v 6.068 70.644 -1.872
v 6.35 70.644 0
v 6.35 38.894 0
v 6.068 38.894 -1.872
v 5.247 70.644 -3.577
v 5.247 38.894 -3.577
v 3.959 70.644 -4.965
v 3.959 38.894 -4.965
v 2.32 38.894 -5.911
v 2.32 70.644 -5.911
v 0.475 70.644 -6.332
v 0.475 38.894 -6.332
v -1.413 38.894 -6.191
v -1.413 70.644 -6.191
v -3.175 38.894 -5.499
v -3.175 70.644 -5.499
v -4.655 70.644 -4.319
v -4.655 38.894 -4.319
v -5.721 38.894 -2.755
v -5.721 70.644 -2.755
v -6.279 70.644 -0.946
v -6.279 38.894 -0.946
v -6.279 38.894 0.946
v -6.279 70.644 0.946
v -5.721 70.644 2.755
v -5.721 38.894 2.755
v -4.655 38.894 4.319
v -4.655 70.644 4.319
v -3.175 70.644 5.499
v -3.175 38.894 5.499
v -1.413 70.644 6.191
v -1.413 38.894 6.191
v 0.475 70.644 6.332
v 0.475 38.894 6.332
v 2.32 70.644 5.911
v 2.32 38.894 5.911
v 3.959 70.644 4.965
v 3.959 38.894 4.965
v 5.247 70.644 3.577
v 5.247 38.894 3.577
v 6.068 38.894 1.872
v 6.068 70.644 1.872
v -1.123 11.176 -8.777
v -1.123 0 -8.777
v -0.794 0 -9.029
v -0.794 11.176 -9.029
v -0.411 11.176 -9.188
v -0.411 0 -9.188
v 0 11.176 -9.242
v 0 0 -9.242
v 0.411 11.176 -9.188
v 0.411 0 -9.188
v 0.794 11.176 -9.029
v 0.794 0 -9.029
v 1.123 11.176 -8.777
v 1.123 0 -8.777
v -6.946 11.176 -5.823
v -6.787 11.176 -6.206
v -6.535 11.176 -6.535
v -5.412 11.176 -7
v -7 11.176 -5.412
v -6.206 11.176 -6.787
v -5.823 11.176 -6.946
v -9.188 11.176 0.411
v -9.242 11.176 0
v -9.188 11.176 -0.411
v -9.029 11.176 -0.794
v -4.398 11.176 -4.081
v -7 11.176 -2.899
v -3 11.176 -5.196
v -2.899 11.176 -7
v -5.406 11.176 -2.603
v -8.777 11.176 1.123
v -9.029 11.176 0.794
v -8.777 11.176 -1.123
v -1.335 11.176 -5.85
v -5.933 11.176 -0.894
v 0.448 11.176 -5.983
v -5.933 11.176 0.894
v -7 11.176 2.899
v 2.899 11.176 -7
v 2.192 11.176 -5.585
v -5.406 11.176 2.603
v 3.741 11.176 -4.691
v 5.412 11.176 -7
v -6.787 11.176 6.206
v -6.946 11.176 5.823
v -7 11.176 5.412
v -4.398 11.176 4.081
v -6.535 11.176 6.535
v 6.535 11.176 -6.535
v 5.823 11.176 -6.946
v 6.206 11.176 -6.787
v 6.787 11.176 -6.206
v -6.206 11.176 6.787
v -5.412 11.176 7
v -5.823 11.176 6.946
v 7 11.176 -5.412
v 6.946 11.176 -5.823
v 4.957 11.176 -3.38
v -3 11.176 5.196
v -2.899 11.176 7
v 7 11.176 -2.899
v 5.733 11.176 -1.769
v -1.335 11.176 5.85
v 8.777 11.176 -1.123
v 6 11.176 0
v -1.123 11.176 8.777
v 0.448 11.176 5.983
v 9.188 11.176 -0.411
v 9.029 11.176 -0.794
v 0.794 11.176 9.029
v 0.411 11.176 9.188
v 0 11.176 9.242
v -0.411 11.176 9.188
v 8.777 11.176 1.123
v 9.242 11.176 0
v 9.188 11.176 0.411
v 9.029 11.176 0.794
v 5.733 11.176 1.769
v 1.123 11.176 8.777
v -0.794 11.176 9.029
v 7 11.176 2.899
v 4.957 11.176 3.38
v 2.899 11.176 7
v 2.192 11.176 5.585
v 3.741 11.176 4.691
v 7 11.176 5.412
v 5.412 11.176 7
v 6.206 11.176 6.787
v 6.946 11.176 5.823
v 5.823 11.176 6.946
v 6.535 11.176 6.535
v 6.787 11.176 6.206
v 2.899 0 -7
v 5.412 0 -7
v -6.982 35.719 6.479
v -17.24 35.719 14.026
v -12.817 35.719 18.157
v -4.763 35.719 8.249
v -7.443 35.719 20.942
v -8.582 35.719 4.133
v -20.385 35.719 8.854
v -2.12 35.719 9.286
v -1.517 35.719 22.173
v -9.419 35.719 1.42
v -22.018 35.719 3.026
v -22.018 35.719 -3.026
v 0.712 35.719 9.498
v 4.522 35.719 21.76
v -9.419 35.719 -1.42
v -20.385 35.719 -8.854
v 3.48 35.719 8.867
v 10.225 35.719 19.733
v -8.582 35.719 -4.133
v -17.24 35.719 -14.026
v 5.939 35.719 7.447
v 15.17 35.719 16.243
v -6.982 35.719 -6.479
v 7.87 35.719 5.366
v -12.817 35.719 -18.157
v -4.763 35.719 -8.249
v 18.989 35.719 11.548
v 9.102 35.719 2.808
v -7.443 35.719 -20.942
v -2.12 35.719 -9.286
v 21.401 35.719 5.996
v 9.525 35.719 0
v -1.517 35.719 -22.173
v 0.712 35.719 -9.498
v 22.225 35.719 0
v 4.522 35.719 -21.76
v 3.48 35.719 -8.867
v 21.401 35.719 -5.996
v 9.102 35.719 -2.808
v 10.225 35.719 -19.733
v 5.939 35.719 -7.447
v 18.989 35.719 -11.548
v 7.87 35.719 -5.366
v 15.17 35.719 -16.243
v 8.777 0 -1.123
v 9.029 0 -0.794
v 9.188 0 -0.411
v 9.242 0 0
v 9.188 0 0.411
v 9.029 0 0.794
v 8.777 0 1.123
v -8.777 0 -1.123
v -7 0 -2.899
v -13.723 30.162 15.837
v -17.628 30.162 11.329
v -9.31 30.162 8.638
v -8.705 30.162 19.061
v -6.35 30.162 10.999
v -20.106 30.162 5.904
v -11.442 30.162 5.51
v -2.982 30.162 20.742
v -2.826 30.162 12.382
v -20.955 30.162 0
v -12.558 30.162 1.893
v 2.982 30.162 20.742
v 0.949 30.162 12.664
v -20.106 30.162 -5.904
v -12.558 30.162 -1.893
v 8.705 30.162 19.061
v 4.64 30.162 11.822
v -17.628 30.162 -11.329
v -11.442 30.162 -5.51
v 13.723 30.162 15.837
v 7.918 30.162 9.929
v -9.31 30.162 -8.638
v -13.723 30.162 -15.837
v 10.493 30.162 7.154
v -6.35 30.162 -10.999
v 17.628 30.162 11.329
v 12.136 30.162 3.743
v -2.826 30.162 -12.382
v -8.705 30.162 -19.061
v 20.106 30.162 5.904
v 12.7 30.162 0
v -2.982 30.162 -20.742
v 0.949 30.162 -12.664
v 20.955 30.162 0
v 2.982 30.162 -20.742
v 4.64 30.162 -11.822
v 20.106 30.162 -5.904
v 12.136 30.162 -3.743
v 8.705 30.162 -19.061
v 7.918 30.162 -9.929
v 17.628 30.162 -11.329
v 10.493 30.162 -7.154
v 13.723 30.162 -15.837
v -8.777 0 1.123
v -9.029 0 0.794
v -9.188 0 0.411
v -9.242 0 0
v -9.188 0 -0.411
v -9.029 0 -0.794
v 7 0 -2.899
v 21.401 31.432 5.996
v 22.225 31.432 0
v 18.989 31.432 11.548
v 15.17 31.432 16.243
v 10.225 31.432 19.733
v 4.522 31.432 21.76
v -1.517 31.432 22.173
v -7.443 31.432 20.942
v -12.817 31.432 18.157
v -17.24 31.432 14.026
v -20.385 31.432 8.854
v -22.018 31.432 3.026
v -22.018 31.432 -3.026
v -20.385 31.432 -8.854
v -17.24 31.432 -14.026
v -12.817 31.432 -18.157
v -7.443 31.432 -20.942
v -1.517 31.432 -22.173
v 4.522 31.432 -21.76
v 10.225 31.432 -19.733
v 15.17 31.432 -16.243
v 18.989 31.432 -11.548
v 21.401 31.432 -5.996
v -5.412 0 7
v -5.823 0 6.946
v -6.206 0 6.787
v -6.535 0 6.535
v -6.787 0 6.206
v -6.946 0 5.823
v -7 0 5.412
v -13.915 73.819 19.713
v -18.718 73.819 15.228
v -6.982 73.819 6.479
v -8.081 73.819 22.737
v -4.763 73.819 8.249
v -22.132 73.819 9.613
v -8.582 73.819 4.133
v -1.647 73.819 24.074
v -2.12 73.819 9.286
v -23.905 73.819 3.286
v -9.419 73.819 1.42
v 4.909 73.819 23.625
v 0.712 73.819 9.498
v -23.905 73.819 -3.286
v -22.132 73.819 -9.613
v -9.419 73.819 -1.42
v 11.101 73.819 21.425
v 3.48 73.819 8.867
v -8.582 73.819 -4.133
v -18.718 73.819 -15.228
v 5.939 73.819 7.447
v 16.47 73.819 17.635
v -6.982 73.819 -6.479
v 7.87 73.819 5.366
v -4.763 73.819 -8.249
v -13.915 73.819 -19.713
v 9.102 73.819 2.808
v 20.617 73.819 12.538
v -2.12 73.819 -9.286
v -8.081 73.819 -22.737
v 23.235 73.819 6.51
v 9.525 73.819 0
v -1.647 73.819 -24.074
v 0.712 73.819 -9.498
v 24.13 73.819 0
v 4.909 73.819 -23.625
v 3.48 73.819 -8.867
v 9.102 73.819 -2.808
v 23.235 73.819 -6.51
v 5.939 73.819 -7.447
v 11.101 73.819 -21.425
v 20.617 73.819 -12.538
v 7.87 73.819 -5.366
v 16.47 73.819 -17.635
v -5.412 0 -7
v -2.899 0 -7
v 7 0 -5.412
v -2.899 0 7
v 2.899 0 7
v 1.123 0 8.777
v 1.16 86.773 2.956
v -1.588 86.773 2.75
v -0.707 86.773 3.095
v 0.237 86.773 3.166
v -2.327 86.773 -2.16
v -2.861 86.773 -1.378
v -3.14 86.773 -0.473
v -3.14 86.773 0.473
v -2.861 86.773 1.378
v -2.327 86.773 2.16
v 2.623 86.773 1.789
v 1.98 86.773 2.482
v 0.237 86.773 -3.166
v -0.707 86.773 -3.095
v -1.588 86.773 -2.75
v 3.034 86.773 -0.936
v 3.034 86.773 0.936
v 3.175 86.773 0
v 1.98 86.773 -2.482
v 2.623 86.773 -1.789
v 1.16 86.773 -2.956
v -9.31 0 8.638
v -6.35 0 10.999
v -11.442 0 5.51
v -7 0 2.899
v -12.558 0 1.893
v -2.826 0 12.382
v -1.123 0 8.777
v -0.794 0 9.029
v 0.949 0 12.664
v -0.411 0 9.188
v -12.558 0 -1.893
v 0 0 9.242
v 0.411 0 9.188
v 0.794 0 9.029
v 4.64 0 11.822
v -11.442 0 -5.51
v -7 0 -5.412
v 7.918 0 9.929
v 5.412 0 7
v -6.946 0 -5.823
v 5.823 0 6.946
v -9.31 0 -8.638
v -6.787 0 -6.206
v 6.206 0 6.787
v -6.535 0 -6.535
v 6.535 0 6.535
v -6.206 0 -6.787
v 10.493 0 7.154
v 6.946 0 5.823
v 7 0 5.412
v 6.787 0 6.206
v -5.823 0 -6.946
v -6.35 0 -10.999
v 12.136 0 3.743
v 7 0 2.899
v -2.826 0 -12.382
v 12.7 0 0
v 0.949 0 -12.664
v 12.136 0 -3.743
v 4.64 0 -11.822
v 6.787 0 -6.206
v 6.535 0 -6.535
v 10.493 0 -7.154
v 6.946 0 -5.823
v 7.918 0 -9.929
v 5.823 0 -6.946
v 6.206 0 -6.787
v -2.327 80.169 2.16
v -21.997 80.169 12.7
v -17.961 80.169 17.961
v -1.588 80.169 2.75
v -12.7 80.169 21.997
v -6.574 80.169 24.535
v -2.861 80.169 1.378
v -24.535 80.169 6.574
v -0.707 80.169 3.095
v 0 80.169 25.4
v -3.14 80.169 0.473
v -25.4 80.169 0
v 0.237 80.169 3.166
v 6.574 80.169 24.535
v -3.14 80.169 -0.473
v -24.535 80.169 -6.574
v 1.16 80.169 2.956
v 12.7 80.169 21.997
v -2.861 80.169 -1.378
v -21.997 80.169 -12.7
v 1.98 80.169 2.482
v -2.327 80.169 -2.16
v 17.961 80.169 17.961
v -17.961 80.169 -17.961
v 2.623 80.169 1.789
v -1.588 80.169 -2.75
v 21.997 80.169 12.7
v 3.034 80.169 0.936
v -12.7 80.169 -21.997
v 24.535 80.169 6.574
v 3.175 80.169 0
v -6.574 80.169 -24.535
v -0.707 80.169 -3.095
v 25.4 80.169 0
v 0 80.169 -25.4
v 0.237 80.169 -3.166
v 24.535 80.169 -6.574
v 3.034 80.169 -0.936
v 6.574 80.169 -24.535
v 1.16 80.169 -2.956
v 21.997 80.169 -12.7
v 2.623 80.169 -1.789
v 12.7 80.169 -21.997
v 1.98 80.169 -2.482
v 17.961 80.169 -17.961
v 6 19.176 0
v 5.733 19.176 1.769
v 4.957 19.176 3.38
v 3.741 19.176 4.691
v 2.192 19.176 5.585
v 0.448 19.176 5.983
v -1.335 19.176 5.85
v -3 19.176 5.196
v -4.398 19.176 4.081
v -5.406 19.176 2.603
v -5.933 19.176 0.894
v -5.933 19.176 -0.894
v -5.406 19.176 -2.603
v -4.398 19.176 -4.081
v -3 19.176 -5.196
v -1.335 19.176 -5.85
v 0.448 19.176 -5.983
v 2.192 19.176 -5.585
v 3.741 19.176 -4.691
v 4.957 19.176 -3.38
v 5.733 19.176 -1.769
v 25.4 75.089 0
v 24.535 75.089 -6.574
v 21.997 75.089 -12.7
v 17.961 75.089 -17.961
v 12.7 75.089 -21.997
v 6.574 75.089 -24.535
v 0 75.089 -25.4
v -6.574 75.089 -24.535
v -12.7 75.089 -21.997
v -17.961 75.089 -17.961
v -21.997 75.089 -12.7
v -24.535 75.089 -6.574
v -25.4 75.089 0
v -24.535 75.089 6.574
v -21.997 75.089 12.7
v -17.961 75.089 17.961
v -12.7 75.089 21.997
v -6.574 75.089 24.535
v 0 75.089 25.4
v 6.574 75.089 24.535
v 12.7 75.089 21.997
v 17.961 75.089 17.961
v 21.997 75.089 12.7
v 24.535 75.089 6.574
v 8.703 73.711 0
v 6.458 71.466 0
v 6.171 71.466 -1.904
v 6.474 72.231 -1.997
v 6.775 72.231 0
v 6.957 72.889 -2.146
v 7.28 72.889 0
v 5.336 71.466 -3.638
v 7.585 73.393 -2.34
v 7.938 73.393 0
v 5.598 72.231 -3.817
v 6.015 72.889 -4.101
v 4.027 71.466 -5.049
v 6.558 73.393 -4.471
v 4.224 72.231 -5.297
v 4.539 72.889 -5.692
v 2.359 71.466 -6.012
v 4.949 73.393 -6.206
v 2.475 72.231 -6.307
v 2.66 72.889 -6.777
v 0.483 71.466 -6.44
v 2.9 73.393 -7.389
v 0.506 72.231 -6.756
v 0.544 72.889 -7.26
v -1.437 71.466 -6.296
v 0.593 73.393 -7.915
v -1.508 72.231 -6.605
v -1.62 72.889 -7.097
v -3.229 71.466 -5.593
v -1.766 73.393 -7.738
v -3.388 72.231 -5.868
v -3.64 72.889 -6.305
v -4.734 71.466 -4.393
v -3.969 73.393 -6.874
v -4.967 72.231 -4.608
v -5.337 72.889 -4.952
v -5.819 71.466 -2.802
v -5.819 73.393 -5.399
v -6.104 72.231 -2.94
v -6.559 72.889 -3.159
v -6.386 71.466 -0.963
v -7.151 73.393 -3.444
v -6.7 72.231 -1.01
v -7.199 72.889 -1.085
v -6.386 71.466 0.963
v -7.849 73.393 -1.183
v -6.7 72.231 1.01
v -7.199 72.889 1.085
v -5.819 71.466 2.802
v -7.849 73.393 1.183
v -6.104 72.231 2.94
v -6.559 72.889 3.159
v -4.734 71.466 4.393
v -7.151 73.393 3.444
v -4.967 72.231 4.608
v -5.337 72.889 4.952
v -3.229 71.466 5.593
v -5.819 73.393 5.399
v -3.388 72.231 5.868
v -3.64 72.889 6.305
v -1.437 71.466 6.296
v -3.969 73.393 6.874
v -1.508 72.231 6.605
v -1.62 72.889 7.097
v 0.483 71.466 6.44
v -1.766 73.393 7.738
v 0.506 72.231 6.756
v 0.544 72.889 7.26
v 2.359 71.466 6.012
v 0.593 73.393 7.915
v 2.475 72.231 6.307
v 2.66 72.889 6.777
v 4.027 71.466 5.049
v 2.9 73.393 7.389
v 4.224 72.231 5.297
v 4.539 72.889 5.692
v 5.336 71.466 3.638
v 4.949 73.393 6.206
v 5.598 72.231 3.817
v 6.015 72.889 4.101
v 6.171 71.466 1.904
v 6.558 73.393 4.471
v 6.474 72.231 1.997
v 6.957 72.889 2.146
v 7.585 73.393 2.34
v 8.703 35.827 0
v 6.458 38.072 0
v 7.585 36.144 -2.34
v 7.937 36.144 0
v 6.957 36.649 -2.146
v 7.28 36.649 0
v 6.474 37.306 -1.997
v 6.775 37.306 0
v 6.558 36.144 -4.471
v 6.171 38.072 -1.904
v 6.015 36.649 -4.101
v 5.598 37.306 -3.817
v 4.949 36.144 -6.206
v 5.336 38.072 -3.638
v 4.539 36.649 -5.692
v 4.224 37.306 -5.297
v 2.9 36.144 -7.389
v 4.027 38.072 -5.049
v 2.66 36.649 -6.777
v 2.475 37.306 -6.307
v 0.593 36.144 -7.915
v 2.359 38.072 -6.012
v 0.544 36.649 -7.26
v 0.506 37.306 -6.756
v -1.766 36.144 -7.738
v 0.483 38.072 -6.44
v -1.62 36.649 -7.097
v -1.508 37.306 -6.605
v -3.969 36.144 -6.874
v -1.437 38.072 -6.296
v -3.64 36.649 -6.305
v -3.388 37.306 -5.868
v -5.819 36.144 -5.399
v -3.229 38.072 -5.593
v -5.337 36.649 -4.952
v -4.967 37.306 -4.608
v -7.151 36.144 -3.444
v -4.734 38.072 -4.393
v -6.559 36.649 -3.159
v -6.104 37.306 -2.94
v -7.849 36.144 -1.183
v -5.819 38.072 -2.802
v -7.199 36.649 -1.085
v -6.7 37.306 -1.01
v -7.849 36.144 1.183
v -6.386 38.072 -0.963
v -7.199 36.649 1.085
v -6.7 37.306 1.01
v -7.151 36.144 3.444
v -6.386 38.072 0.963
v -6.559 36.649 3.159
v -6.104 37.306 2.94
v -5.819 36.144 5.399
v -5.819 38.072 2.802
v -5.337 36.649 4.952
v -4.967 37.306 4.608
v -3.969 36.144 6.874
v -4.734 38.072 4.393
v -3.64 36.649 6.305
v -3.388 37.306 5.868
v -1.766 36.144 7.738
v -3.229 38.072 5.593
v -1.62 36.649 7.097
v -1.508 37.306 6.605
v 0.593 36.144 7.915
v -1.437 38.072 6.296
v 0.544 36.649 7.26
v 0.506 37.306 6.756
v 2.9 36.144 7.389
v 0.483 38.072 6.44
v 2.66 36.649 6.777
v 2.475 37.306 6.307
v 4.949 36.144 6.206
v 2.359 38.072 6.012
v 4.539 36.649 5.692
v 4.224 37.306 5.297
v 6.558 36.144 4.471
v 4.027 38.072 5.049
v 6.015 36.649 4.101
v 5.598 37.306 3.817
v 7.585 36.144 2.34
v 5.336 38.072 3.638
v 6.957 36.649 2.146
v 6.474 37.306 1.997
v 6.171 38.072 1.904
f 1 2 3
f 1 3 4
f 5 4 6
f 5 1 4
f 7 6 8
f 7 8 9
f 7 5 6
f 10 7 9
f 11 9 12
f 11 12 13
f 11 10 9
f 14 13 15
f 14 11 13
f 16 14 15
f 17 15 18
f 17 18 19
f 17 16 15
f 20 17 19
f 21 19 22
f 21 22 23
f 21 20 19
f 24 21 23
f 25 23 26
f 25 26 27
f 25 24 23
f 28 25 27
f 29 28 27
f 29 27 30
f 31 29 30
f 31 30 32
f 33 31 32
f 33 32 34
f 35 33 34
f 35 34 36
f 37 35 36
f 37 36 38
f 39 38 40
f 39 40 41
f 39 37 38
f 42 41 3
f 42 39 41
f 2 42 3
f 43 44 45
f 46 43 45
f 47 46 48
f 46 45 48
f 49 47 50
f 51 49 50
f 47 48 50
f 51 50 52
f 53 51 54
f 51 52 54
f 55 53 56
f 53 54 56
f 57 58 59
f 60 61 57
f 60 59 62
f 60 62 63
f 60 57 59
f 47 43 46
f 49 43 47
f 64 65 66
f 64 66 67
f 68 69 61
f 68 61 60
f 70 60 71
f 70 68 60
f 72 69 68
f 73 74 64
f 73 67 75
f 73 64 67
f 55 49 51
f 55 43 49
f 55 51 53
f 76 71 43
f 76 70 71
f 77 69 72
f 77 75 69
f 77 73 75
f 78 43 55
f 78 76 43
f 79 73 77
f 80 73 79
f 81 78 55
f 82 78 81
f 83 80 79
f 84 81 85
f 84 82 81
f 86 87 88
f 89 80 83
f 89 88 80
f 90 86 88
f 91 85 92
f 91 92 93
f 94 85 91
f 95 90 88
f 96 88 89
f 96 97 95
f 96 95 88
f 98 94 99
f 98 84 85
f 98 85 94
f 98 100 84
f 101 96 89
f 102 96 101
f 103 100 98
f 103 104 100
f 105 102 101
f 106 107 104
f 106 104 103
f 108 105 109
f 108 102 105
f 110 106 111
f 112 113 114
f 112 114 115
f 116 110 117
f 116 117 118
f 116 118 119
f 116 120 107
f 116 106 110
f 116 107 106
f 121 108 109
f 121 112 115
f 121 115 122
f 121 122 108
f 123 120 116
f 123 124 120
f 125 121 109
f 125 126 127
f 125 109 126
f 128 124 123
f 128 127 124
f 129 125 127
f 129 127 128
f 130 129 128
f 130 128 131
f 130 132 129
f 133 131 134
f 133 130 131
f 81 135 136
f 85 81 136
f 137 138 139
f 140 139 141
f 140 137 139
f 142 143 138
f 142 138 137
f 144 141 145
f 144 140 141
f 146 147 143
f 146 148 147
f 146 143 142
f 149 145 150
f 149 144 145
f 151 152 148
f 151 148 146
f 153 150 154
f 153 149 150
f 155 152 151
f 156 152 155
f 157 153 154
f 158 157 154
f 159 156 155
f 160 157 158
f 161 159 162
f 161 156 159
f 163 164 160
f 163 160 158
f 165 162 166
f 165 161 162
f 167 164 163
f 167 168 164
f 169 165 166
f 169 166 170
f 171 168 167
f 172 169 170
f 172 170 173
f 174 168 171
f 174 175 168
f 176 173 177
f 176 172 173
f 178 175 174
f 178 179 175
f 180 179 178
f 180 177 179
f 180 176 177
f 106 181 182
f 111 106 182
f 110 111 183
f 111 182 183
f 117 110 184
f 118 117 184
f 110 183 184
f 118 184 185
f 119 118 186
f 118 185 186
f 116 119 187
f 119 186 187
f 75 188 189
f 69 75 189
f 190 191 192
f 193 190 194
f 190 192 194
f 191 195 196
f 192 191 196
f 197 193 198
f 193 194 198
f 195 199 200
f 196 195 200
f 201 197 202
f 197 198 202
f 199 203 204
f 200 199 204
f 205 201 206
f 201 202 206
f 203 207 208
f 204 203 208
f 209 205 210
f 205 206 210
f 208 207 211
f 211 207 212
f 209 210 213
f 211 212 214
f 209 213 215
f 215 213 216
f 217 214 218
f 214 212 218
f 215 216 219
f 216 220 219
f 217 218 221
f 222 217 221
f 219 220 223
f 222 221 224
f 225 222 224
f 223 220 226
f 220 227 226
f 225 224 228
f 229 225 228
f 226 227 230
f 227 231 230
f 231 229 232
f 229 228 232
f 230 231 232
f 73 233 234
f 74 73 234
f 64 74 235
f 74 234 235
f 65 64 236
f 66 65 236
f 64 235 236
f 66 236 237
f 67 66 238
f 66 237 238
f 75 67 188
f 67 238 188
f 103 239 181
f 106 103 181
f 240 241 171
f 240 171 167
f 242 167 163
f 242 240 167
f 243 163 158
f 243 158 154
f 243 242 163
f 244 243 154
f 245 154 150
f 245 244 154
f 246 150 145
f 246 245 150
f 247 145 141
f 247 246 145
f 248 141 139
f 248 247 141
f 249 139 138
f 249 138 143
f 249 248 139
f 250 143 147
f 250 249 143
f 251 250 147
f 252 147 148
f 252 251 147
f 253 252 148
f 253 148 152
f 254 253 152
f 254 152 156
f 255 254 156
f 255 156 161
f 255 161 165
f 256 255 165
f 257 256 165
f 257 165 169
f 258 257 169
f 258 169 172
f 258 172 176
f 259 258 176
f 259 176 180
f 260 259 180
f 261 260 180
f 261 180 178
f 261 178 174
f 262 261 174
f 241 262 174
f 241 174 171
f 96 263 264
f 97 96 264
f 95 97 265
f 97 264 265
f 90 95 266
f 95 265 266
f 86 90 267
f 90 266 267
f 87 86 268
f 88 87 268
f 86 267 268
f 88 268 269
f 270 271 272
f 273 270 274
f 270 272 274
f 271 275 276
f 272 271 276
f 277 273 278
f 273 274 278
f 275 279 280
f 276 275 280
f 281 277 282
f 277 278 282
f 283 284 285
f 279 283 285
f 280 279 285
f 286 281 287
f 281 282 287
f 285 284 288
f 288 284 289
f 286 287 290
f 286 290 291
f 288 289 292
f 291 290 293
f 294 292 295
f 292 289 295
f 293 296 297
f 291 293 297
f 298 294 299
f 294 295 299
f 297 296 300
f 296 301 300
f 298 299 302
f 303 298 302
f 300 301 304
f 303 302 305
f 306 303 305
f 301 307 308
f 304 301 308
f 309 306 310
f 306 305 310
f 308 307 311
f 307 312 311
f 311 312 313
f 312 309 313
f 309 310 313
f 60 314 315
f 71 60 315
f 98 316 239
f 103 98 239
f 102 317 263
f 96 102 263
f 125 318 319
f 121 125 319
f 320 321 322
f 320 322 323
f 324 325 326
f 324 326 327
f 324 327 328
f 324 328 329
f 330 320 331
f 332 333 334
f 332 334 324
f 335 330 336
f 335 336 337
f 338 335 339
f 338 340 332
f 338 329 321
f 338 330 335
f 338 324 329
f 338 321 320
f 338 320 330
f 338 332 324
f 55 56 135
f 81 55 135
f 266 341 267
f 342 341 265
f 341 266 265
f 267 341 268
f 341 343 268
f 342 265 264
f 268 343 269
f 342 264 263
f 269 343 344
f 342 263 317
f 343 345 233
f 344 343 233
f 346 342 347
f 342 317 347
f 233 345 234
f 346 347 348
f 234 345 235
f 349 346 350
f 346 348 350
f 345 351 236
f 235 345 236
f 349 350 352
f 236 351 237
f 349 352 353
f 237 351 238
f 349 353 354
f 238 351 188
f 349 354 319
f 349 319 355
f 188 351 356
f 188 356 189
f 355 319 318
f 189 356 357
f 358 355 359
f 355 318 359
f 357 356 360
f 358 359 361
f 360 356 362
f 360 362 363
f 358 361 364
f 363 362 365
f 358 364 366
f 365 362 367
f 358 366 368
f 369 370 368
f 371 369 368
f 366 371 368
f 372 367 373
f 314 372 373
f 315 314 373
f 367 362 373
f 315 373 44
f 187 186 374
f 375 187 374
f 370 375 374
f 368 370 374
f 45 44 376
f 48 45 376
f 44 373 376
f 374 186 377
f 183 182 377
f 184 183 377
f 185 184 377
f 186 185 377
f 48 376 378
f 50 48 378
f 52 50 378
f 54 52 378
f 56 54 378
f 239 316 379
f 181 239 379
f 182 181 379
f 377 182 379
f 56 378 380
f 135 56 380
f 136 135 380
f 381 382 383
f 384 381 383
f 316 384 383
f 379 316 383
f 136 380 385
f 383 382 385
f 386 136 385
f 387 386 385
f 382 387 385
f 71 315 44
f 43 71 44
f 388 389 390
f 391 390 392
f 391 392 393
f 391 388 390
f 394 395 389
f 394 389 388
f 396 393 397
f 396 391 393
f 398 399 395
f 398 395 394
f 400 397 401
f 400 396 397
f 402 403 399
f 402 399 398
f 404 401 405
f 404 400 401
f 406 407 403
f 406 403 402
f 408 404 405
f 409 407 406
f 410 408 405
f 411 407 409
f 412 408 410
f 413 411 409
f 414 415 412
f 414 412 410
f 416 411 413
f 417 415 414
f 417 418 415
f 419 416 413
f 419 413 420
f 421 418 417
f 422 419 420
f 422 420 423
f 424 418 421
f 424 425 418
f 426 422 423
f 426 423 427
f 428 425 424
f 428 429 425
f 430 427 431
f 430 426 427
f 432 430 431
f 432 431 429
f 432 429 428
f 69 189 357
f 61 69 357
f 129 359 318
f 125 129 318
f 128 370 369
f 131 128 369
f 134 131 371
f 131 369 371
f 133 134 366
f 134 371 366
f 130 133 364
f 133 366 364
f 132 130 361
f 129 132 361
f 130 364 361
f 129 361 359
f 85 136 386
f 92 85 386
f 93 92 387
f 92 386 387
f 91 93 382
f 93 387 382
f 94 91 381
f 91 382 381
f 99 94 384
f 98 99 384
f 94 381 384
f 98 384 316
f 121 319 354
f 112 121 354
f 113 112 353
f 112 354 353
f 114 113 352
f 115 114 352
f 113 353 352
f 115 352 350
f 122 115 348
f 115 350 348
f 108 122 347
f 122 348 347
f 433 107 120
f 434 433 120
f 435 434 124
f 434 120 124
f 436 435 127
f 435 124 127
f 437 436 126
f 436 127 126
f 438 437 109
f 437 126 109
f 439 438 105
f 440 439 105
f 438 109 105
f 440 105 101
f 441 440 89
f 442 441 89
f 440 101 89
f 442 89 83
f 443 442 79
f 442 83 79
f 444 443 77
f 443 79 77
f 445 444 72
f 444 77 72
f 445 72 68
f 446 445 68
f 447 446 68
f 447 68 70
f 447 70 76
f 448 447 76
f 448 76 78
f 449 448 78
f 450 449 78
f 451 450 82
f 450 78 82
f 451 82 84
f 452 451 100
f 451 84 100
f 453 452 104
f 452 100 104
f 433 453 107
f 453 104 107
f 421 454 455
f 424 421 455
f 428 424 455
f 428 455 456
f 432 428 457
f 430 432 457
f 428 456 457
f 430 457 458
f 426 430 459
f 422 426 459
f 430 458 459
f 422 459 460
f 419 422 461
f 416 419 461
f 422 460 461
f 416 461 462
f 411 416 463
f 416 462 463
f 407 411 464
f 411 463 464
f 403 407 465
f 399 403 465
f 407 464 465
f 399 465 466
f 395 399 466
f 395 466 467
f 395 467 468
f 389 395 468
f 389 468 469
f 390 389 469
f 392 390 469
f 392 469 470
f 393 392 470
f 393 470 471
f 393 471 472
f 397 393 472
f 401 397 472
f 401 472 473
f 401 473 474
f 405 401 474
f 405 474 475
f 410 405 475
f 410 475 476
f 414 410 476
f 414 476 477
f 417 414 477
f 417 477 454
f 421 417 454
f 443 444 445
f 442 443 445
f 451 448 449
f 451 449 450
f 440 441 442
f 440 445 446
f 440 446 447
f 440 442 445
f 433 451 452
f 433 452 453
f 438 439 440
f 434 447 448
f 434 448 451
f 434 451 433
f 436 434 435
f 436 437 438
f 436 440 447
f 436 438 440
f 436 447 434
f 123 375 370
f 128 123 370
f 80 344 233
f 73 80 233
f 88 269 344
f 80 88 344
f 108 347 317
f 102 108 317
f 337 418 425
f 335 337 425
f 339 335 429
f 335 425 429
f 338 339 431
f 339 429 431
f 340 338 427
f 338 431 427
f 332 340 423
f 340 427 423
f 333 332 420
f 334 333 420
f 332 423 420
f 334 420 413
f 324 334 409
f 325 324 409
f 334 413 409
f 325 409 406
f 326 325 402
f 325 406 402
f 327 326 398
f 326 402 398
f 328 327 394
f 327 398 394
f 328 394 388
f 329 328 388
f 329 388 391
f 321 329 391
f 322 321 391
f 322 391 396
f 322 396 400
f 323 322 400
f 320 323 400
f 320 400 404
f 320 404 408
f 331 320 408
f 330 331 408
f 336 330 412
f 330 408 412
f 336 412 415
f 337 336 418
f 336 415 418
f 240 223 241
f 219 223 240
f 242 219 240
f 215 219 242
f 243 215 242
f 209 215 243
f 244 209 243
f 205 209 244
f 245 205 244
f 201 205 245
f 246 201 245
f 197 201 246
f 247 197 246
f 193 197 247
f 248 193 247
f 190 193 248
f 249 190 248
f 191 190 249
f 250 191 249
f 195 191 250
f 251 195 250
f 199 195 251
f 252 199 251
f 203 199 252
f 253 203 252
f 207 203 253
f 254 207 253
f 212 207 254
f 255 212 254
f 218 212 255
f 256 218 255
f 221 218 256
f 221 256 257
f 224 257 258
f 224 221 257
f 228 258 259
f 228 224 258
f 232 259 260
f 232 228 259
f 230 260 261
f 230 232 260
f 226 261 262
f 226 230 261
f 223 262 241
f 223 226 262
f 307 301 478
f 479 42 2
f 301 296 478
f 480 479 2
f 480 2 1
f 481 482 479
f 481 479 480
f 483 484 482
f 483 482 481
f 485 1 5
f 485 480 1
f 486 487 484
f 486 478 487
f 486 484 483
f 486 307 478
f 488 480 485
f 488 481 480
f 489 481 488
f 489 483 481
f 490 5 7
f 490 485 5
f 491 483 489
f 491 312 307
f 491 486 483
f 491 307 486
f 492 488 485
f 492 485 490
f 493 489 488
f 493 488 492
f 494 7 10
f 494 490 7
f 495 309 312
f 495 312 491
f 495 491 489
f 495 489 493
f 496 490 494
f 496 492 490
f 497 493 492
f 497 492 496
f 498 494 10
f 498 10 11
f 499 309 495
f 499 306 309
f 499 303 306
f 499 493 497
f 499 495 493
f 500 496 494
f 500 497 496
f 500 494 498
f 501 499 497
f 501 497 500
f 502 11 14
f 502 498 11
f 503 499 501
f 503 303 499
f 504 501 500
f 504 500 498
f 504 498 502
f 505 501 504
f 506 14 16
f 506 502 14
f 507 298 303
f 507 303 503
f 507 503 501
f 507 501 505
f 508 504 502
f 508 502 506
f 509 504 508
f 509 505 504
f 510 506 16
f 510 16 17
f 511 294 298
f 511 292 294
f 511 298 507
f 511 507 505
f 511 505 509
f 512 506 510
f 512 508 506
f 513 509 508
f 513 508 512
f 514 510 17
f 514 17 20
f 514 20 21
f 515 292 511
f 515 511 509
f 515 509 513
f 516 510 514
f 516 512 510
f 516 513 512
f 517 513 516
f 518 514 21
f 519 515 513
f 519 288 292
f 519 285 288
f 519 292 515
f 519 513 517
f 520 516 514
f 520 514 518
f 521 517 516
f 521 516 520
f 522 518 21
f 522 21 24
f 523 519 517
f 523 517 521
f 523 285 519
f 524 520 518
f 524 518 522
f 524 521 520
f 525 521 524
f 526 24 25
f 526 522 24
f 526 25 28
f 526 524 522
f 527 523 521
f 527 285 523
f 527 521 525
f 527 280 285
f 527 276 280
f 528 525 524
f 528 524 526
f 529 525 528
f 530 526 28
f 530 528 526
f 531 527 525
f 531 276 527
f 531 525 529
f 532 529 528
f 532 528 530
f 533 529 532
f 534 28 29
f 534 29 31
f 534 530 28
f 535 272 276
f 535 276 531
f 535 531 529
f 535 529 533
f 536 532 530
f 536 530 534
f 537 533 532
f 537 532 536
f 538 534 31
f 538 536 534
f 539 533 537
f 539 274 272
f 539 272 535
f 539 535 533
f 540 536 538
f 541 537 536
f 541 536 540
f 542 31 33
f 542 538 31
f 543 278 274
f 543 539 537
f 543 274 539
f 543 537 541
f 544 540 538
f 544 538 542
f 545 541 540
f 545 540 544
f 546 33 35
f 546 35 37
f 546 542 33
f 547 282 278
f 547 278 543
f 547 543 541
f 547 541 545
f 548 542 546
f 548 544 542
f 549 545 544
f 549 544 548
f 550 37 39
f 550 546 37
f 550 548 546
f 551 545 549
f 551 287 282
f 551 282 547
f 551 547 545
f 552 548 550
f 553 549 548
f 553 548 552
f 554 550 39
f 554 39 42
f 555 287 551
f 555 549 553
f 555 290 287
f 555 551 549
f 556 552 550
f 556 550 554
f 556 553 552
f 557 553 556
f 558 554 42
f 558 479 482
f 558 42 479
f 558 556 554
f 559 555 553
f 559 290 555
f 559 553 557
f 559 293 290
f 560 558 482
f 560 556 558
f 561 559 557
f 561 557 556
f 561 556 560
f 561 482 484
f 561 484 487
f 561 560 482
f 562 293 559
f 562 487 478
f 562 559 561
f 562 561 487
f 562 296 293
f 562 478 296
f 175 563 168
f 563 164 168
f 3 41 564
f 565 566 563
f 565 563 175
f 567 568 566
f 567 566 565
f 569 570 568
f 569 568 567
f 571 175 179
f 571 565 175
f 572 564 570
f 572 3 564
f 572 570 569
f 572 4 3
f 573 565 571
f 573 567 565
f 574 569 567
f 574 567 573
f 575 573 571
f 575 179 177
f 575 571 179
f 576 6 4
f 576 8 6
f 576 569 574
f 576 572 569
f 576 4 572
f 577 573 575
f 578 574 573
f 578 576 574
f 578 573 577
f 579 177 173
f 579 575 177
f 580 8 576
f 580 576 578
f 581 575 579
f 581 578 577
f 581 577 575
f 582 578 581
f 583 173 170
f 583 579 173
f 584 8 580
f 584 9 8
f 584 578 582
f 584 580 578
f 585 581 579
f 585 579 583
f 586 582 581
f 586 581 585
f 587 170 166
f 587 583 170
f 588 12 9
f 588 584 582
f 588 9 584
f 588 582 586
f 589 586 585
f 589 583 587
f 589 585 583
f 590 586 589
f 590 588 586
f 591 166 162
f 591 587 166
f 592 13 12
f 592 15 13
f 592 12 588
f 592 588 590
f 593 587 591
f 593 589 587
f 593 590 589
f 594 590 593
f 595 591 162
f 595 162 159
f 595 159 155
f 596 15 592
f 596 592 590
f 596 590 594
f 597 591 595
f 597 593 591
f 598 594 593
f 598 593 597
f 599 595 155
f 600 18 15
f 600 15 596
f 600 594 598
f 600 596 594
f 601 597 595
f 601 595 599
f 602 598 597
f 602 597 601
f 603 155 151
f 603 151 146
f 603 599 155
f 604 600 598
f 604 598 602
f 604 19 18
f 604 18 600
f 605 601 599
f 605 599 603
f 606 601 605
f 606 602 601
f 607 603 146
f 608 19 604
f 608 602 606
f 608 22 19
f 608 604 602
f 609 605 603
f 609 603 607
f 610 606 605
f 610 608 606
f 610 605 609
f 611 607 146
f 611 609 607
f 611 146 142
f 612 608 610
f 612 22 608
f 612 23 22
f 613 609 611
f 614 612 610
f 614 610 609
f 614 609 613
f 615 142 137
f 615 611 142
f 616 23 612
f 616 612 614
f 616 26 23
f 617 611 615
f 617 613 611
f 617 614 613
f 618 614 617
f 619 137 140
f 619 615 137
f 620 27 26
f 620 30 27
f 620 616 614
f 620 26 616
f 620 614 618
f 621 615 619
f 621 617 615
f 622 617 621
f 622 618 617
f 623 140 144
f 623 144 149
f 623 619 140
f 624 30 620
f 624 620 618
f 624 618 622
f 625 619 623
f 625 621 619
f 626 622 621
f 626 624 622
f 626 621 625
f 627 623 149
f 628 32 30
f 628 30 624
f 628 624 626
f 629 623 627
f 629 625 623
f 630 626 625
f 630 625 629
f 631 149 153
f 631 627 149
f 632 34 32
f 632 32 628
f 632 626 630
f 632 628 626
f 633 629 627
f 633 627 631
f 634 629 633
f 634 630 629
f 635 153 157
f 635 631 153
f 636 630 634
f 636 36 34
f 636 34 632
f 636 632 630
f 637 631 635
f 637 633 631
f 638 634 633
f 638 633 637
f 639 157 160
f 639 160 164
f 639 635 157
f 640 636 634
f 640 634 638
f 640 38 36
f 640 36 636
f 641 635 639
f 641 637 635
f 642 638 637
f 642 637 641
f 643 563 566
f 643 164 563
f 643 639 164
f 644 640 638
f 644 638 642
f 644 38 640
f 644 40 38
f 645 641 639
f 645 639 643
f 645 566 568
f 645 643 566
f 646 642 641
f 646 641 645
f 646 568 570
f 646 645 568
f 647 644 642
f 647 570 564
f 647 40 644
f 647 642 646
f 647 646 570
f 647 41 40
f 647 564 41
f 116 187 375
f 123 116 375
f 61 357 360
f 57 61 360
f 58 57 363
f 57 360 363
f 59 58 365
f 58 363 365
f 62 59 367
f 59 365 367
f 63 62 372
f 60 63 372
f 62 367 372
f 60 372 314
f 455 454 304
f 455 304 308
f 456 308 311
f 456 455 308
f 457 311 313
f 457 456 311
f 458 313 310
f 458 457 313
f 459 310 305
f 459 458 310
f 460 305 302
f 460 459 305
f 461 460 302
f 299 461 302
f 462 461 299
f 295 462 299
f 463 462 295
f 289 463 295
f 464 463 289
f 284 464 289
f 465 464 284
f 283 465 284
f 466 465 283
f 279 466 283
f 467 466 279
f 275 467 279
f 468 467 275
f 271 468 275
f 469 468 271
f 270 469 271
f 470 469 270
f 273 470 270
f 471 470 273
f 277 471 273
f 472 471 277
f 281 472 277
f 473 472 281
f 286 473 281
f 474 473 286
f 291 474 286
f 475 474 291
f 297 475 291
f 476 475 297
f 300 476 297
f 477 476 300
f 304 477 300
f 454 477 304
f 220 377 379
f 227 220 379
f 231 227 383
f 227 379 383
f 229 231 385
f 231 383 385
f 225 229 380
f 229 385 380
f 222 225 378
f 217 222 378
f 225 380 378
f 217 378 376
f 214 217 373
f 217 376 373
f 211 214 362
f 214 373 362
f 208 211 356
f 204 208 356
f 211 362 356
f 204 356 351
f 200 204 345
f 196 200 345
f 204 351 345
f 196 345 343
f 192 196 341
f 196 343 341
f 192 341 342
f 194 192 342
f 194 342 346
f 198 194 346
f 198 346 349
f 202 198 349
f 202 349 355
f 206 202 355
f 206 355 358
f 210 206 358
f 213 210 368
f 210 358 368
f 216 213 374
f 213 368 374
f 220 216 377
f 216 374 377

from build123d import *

# Parameters (mm, degrees)
SKETCH1_R           = 12.7
BOSS_EXTRUDE1_DEPTH = 30.1625
SKETCH4_R           = 25.4
BOSS_EXTRUDE2_DEPTH = 50.00625
CUT_EXTRUDE1_DEPTH  = 11.176
SKETCH3_R           = 6
CUT_EXTRUDE2_DEPTH  = 8
SKETCH5_R           = 3.175
BOSS_EXTRUDE3_DEPTH = 6.604
CUT_EXTRUDE3_START  = -6.35
SKETCH9_R           = 25.4
SKETCH9_R_2         = 6.35
CUT_EXTRUDE3_DEPTH  = 38.1
CUT_EXTRUDE4_REACH  = 58.61
SKETCH10_R          = 25.4
SKETCH10_R_2        = 22.225
FILLET1_R           = 3.175
CHAMFER1_SIZE       = 1.27


with BuildPart() as part:
    # Sketch1 → Boss-Extrude1 (new body)
    with BuildSketch(Plane(origin=(0, 0, 0), x_dir=(1, 0, 0), z_dir=(0, 1, 0))):
        Circle(SKETCH1_R)
    extrude(amount=BOSS_EXTRUDE1_DEPTH)

    # Sketch4 → Boss-Extrude2 (add)
    with BuildSketch(Plane(origin=(0, 30.1625, 0), x_dir=(1, 0, 0), z_dir=(0, 1, 0))):
        Circle(SKETCH4_R)
    extrude(amount=BOSS_EXTRUDE2_DEPTH)

    # Sketch2 → Cut-Extrude1 (cut)
    with BuildSketch(Plane.XZ):
        with BuildLine():
            Line((-7, 2.899494937), (-8.776962921, 1.122532015))
            ThreePointArc((-8.776962921, 1.122532015), (-9.241930906, 0), (-8.776962921, -1.122532015))
            Line((-8.776962921, -1.122532015), (-7, -2.899494937))
            Line((-7, -2.899494937), (-7, 2.899494937))
        make_face()
        Polygon((-2.899494937, 7), (-7, 2.899494937), (-7, -2.899494937), (-2.899494937, -7), (2.899494937, -7), (7, -2.899494937), (7, 2.899494937), (2.899494937, 7), align=None)
        with BuildLine():
            Line((-7, 5.4125), (-7, 2.899494937))
            Line((-7, 2.899494937), (-2.899494937, 7))
            Line((-2.899494937, 7), (-5.4125, 7))
            ThreePointArc((-5.4125, 7), (-6.535032015, 6.535032015), (-7, 5.4125))
        make_face()
        with BuildLine():
            Line((-1.122532015, 8.776962921), (-2.899494937, 7))
            Line((-2.899494937, 7), (2.899494937, 7))
            Line((2.899494937, 7), (1.122532015, 8.776962921))
            ThreePointArc((1.122532015, 8.776962921), (0, 9.241930906), (-1.122532015, 8.776962921))
        make_face()
        with BuildLine():
            Line((5.4125, 7), (2.899494937, 7))
            Line((2.899494937, 7), (7, 2.899494937))
            Line((7, 2.899494937), (7, 5.4125))
            ThreePointArc((7, 5.4125), (6.535032015, 6.535032015), (5.4125, 7))
        make_face()
        with BuildLine():
            Line((8.776962921, 1.122532015), (7, 2.899494937))
            Line((7, 2.899494937), (7, -2.899494937))
            Line((7, -2.899494937), (8.776962921, -1.122532015))
            ThreePointArc((8.776962921, -1.122532015), (9.241930906, 0), (8.776962921, 1.122532015))
        make_face()
        with BuildLine():
            Line((7, -2.899494937), (2.899494937, -7))
            Line((2.899494937, -7), (5.4125, -7))
            ThreePointArc((5.4125, -7), (6.535032015, -6.535032015), (7, -5.4125))
            Line((7, -5.4125), (7, -2.899494937))
        make_face()
        with BuildLine():
            Line((2.899494937, -7), (-2.899494937, -7))
            Line((-2.899494937, -7), (-1.122532015, -8.776962921))
            ThreePointArc((-1.122532015, -8.776962921), (0, -9.241930906), (1.122532015, -8.776962921))
            Line((1.122532015, -8.776962921), (2.899494937, -7))
        make_face()
        with BuildLine():
            Line((-2.899494937, -7), (-7, -2.899494937))
            Line((-7, -2.899494937), (-7, -5.4125))
            ThreePointArc((-7, -5.4125), (-6.535032015, -6.535032015), (-5.4125, -7))
            Line((-5.4125, -7), (-2.899494937, -7))
        make_face()
    extrude(amount=-CUT_EXTRUDE1_DEPTH, mode=Mode.SUBTRACT)

    # Sketch3 → Cut-Extrude2 (cut)
    with BuildSketch(Plane.XZ.offset(-11.176)):
        Circle(SKETCH3_R)
    extrude(amount=-CUT_EXTRUDE2_DEPTH, mode=Mode.SUBTRACT)

    # Sketch5 → Boss-Extrude3 (add)
    with BuildSketch(Plane(origin=(0, 80.16875, 0), x_dir=(1, 0, 0), z_dir=(0, 1, 0))):
        Circle(SKETCH5_R)
    extrude(amount=BOSS_EXTRUDE3_DEPTH)

    # Sketch9 → Cut-Extrude3 (cut)
    with BuildSketch(Plane(origin=(0, 80.16875, 0), x_dir=(1, 0, 0), z_dir=(0, 1, 0)).offset(CUT_EXTRUDE3_START)):
        Circle(SKETCH9_R)
        Circle(SKETCH9_R_2, mode=Mode.SUBTRACT)
    extrude(amount=-CUT_EXTRUDE3_DEPTH, mode=Mode.SUBTRACT)

    # Sketch10 → Cut-Extrude4 (cut, up to next)
    with BuildSketch(Plane.XZ.offset(-30.1625), mode=Mode.PRIVATE) as cut_extrude4_sk1:
        Circle(SKETCH10_R)
        Circle(SKETCH10_R_2, mode=Mode.SUBTRACT)
    cut_extrude4_tool1 = extrude(cut_extrude4_sk1.sketch, amount=-CUT_EXTRUDE4_REACH, mode=Mode.PRIVATE) & part.part
    add(cut_extrude4_tool1.solids().sort_by_distance((-24.68158, 30.1625, 0))[0], mode=Mode.SUBTRACT)

    # Fillet1
    fillet1_edges = [part.edges().sort_by_distance(p)[0] for p in [
        (-6.35, 35.71875, 0),
        (-6.35, 73.81875, 0),
    ]]
    fillet(fillet1_edges, radius=FILLET1_R)

    # Chamfer1
    chamfer1_edges = [part.edges().sort_by_distance(p)[0] for p in [
        (-25.4, 73.81875, 0),
        (-22.225, 30.1625, 0),
    ]]
    chamfer(chamfer1_edges, length=CHAMFER1_SIZE)


solid = part.part
